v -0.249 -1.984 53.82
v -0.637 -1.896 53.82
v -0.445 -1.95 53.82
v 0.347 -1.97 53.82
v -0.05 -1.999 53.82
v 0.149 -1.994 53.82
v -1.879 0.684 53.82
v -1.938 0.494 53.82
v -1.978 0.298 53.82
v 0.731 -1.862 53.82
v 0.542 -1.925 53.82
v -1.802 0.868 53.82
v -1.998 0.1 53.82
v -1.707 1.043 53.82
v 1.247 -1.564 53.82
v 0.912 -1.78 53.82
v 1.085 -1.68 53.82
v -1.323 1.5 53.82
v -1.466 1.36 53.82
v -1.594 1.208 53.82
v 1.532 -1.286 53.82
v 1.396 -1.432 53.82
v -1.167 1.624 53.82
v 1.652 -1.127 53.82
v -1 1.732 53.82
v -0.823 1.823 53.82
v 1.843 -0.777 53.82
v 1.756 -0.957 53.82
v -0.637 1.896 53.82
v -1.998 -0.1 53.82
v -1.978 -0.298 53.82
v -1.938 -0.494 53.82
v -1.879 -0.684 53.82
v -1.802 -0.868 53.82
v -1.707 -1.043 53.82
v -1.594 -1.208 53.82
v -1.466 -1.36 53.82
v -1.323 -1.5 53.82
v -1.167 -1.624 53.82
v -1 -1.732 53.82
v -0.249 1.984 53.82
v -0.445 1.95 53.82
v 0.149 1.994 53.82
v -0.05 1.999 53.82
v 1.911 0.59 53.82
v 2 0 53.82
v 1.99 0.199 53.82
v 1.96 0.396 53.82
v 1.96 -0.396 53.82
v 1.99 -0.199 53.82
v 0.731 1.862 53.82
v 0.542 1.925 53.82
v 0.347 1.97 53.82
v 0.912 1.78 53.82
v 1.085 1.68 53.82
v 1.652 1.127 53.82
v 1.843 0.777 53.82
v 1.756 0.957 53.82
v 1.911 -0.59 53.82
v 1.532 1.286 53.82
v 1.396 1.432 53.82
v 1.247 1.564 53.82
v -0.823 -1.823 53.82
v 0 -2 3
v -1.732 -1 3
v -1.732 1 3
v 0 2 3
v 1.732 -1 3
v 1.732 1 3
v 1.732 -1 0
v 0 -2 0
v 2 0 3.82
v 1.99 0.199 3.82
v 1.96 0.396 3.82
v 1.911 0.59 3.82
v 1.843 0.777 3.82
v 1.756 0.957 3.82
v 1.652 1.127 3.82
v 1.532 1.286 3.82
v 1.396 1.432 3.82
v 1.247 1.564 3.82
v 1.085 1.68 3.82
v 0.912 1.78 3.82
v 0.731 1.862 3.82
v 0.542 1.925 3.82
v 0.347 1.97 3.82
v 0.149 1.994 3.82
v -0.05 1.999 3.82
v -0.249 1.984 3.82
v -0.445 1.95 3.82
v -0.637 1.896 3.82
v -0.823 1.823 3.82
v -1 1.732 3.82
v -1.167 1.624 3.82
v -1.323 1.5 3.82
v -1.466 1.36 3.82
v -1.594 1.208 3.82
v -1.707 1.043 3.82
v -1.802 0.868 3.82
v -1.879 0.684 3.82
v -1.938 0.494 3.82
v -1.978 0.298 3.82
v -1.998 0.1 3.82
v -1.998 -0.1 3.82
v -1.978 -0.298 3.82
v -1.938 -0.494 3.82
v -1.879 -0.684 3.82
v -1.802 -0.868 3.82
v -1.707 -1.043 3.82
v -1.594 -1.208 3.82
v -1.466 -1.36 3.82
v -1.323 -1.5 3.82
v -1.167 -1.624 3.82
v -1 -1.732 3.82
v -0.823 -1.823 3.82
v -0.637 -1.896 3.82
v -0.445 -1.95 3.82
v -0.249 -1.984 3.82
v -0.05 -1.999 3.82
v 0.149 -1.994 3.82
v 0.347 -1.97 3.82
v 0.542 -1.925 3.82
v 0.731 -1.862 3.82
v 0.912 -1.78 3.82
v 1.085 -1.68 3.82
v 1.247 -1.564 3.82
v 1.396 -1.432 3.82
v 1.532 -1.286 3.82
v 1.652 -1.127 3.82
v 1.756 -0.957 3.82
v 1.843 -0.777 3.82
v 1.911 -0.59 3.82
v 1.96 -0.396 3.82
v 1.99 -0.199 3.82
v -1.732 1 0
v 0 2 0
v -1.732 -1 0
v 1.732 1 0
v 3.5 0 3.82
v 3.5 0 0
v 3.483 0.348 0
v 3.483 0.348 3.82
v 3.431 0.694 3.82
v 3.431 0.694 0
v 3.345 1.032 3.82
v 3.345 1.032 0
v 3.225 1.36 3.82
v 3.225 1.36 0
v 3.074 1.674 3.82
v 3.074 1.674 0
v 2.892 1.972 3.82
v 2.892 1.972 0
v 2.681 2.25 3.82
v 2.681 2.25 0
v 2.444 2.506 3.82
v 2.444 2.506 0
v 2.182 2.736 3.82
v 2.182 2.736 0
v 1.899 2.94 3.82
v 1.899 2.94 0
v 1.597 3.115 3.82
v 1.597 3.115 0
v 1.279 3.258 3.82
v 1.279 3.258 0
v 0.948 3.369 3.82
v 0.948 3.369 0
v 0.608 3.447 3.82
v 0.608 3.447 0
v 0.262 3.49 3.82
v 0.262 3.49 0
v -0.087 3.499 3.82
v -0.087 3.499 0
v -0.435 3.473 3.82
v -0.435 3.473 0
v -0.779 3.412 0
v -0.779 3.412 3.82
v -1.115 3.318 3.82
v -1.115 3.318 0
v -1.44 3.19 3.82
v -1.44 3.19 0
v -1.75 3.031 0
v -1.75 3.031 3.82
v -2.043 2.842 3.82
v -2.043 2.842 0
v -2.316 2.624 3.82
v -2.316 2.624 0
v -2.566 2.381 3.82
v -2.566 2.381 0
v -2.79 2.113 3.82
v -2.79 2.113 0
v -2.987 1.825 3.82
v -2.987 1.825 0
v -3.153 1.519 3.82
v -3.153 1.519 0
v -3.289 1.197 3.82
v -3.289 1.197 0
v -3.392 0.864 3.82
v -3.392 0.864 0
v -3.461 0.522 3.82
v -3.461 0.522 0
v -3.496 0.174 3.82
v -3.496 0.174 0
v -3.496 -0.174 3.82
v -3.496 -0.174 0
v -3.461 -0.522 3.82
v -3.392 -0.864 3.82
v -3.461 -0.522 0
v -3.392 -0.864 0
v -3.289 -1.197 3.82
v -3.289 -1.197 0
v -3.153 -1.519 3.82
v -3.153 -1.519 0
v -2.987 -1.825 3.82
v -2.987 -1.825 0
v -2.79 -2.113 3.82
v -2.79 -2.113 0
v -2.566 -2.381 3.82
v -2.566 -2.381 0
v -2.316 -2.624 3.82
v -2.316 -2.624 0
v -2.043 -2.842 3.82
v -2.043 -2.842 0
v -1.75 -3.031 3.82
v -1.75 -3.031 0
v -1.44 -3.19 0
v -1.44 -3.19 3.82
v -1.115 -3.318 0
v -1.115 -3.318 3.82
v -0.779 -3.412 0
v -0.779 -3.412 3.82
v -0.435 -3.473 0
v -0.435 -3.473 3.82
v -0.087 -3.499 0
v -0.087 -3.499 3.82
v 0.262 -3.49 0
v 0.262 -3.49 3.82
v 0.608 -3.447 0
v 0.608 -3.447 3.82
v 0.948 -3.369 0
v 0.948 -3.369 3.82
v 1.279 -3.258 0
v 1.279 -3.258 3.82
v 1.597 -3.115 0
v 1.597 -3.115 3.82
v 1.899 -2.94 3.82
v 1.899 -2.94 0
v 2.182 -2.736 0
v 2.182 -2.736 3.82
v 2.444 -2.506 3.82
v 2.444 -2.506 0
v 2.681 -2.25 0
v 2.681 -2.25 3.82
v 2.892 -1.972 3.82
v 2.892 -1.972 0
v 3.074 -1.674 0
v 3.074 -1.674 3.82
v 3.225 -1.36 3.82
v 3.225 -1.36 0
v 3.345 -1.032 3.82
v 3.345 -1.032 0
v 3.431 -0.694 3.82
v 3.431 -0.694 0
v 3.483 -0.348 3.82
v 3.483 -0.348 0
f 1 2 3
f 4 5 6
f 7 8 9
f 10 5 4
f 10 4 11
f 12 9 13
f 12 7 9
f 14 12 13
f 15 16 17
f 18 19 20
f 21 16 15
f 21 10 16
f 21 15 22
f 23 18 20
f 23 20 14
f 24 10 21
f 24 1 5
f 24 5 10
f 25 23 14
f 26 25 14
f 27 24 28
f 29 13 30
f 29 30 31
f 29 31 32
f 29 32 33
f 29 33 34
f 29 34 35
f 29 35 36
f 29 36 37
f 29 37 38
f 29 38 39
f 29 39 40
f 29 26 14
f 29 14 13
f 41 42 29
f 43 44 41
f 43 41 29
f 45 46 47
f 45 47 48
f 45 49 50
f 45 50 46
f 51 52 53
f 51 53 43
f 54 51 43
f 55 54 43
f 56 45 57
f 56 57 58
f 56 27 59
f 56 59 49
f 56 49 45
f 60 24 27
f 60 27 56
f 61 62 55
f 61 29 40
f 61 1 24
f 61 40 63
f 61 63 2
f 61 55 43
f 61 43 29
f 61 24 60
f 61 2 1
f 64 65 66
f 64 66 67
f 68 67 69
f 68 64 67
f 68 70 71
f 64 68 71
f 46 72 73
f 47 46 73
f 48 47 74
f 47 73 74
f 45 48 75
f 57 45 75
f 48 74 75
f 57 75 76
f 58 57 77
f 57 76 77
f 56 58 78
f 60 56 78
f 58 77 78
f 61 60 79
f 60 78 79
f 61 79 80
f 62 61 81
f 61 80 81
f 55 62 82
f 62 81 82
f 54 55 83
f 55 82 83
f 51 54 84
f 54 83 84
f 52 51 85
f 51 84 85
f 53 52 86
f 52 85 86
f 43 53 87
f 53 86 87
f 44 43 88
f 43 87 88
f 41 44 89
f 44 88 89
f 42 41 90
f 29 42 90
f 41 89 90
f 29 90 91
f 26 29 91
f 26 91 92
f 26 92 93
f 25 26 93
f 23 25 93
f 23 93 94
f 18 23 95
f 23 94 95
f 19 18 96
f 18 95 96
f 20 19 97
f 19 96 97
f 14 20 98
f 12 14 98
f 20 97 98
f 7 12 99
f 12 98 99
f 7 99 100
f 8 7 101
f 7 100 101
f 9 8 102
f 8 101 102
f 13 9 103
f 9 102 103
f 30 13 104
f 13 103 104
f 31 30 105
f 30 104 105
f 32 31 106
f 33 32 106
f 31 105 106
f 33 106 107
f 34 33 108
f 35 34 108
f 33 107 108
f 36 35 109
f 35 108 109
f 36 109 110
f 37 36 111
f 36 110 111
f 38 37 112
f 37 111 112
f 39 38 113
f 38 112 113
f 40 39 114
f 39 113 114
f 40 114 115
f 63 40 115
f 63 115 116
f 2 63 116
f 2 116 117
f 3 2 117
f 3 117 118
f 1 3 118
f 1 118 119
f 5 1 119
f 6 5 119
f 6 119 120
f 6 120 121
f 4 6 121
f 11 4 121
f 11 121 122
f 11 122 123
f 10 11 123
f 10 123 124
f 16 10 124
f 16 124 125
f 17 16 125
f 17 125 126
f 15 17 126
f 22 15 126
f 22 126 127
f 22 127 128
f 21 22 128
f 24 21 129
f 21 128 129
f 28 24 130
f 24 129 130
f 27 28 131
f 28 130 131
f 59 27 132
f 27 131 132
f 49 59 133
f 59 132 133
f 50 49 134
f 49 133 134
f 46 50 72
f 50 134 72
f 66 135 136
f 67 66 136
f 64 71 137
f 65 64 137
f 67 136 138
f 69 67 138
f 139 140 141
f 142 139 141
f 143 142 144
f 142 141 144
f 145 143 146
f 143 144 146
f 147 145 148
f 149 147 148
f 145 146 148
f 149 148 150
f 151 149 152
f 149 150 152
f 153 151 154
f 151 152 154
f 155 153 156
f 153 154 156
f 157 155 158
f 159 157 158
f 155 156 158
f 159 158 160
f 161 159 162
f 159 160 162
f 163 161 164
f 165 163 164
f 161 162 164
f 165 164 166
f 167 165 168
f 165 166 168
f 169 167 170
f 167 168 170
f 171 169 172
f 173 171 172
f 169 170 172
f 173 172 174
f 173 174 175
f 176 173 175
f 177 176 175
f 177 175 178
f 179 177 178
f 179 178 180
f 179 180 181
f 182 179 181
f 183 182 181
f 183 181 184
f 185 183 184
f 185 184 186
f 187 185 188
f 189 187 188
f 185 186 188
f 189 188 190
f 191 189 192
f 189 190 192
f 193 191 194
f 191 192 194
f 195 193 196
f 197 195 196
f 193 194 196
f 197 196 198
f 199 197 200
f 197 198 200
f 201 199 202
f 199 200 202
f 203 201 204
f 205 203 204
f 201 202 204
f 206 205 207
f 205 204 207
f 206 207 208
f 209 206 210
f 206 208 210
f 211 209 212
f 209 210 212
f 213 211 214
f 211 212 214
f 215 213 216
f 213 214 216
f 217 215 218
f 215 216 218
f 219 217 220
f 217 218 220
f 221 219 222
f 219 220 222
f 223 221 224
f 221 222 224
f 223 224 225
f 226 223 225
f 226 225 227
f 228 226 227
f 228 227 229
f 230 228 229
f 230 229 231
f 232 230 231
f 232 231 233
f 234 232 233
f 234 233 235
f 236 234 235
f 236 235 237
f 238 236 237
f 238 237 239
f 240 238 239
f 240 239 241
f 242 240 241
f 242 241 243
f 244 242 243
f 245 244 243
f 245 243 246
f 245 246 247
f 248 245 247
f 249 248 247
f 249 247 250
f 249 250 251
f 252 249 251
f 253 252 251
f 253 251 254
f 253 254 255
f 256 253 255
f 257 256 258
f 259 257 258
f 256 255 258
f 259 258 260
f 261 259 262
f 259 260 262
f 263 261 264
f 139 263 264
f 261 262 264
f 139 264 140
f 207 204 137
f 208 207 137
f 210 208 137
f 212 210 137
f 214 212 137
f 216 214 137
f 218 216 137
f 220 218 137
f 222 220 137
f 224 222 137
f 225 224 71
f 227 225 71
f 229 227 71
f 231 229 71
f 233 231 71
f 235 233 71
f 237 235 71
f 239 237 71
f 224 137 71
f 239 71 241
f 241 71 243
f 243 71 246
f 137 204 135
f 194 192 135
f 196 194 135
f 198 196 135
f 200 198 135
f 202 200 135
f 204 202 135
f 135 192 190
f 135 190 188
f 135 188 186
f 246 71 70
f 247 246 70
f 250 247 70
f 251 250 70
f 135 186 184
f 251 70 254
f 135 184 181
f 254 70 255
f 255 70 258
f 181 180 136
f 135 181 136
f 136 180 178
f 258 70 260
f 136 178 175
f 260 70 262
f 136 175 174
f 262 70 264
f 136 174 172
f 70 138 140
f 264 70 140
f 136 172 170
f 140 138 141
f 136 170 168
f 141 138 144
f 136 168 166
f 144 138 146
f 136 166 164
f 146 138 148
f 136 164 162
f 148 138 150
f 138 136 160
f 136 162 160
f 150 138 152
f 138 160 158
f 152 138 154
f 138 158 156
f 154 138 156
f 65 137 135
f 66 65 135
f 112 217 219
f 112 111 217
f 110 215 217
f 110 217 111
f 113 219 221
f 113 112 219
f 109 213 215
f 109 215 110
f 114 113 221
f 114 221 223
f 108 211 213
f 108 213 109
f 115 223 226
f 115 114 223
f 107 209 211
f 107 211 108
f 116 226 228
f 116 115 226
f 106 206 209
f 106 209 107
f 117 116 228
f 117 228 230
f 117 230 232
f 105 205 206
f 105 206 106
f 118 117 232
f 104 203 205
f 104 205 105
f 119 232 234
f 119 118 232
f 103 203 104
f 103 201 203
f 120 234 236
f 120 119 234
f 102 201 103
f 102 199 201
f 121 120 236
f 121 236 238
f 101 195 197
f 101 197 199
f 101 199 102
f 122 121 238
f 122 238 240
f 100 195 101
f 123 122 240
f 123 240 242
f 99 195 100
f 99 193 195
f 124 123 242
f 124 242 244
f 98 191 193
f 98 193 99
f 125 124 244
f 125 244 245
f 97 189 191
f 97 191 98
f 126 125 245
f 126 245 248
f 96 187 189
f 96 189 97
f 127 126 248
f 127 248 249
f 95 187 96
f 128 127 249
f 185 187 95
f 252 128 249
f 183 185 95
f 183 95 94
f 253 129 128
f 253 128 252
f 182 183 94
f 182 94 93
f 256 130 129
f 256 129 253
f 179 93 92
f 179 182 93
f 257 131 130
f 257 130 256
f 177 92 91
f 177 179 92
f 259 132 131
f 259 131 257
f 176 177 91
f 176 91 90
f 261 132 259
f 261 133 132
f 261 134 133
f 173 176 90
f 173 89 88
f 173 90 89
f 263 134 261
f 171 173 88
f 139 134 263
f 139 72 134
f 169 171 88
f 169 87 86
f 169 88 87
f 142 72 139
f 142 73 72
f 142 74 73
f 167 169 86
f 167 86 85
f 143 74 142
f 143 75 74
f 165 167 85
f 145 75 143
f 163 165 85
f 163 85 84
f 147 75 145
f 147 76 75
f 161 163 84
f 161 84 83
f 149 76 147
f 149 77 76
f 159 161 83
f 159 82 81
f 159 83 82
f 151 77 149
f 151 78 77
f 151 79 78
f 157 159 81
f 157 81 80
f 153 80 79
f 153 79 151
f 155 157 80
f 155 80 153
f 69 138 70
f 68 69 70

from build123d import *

# Parameters (mm, degrees)
CYLINDER_R      = 3.5
CYLINDER_DEPTH  = 3.82
SKETCH002_R     = 2
PAD001_DEPTH    = 50
POCKET001_DEPTH = 3


with BuildPart() as part:
    # Cylinder → Cylinder (new body)
    with BuildSketch(Plane.XY):
        Circle(CYLINDER_R)
    extrude(amount=CYLINDER_DEPTH)

    # Sketch002 → Pad001 (new body)
    with BuildSketch(Plane.XY.offset(3.82)):
        Circle(SKETCH002_R)
    extrude(amount=PAD001_DEPTH)

    # Sketch003 → Pocket001 (cut)
    with BuildSketch(Plane(origin=(0, 0, 0), x_dir=(1, 0, 0), z_dir=(0, 0, -1))):
        Polygon((1.732051, 1), (0, 2), (-1.732051, 1), (-1.732051, -1), (0, -2), (1.732051, -1), align=None)
    extrude(amount=-POCKET001_DEPTH, mode=Mode.SUBTRACT)


solid = part.part
